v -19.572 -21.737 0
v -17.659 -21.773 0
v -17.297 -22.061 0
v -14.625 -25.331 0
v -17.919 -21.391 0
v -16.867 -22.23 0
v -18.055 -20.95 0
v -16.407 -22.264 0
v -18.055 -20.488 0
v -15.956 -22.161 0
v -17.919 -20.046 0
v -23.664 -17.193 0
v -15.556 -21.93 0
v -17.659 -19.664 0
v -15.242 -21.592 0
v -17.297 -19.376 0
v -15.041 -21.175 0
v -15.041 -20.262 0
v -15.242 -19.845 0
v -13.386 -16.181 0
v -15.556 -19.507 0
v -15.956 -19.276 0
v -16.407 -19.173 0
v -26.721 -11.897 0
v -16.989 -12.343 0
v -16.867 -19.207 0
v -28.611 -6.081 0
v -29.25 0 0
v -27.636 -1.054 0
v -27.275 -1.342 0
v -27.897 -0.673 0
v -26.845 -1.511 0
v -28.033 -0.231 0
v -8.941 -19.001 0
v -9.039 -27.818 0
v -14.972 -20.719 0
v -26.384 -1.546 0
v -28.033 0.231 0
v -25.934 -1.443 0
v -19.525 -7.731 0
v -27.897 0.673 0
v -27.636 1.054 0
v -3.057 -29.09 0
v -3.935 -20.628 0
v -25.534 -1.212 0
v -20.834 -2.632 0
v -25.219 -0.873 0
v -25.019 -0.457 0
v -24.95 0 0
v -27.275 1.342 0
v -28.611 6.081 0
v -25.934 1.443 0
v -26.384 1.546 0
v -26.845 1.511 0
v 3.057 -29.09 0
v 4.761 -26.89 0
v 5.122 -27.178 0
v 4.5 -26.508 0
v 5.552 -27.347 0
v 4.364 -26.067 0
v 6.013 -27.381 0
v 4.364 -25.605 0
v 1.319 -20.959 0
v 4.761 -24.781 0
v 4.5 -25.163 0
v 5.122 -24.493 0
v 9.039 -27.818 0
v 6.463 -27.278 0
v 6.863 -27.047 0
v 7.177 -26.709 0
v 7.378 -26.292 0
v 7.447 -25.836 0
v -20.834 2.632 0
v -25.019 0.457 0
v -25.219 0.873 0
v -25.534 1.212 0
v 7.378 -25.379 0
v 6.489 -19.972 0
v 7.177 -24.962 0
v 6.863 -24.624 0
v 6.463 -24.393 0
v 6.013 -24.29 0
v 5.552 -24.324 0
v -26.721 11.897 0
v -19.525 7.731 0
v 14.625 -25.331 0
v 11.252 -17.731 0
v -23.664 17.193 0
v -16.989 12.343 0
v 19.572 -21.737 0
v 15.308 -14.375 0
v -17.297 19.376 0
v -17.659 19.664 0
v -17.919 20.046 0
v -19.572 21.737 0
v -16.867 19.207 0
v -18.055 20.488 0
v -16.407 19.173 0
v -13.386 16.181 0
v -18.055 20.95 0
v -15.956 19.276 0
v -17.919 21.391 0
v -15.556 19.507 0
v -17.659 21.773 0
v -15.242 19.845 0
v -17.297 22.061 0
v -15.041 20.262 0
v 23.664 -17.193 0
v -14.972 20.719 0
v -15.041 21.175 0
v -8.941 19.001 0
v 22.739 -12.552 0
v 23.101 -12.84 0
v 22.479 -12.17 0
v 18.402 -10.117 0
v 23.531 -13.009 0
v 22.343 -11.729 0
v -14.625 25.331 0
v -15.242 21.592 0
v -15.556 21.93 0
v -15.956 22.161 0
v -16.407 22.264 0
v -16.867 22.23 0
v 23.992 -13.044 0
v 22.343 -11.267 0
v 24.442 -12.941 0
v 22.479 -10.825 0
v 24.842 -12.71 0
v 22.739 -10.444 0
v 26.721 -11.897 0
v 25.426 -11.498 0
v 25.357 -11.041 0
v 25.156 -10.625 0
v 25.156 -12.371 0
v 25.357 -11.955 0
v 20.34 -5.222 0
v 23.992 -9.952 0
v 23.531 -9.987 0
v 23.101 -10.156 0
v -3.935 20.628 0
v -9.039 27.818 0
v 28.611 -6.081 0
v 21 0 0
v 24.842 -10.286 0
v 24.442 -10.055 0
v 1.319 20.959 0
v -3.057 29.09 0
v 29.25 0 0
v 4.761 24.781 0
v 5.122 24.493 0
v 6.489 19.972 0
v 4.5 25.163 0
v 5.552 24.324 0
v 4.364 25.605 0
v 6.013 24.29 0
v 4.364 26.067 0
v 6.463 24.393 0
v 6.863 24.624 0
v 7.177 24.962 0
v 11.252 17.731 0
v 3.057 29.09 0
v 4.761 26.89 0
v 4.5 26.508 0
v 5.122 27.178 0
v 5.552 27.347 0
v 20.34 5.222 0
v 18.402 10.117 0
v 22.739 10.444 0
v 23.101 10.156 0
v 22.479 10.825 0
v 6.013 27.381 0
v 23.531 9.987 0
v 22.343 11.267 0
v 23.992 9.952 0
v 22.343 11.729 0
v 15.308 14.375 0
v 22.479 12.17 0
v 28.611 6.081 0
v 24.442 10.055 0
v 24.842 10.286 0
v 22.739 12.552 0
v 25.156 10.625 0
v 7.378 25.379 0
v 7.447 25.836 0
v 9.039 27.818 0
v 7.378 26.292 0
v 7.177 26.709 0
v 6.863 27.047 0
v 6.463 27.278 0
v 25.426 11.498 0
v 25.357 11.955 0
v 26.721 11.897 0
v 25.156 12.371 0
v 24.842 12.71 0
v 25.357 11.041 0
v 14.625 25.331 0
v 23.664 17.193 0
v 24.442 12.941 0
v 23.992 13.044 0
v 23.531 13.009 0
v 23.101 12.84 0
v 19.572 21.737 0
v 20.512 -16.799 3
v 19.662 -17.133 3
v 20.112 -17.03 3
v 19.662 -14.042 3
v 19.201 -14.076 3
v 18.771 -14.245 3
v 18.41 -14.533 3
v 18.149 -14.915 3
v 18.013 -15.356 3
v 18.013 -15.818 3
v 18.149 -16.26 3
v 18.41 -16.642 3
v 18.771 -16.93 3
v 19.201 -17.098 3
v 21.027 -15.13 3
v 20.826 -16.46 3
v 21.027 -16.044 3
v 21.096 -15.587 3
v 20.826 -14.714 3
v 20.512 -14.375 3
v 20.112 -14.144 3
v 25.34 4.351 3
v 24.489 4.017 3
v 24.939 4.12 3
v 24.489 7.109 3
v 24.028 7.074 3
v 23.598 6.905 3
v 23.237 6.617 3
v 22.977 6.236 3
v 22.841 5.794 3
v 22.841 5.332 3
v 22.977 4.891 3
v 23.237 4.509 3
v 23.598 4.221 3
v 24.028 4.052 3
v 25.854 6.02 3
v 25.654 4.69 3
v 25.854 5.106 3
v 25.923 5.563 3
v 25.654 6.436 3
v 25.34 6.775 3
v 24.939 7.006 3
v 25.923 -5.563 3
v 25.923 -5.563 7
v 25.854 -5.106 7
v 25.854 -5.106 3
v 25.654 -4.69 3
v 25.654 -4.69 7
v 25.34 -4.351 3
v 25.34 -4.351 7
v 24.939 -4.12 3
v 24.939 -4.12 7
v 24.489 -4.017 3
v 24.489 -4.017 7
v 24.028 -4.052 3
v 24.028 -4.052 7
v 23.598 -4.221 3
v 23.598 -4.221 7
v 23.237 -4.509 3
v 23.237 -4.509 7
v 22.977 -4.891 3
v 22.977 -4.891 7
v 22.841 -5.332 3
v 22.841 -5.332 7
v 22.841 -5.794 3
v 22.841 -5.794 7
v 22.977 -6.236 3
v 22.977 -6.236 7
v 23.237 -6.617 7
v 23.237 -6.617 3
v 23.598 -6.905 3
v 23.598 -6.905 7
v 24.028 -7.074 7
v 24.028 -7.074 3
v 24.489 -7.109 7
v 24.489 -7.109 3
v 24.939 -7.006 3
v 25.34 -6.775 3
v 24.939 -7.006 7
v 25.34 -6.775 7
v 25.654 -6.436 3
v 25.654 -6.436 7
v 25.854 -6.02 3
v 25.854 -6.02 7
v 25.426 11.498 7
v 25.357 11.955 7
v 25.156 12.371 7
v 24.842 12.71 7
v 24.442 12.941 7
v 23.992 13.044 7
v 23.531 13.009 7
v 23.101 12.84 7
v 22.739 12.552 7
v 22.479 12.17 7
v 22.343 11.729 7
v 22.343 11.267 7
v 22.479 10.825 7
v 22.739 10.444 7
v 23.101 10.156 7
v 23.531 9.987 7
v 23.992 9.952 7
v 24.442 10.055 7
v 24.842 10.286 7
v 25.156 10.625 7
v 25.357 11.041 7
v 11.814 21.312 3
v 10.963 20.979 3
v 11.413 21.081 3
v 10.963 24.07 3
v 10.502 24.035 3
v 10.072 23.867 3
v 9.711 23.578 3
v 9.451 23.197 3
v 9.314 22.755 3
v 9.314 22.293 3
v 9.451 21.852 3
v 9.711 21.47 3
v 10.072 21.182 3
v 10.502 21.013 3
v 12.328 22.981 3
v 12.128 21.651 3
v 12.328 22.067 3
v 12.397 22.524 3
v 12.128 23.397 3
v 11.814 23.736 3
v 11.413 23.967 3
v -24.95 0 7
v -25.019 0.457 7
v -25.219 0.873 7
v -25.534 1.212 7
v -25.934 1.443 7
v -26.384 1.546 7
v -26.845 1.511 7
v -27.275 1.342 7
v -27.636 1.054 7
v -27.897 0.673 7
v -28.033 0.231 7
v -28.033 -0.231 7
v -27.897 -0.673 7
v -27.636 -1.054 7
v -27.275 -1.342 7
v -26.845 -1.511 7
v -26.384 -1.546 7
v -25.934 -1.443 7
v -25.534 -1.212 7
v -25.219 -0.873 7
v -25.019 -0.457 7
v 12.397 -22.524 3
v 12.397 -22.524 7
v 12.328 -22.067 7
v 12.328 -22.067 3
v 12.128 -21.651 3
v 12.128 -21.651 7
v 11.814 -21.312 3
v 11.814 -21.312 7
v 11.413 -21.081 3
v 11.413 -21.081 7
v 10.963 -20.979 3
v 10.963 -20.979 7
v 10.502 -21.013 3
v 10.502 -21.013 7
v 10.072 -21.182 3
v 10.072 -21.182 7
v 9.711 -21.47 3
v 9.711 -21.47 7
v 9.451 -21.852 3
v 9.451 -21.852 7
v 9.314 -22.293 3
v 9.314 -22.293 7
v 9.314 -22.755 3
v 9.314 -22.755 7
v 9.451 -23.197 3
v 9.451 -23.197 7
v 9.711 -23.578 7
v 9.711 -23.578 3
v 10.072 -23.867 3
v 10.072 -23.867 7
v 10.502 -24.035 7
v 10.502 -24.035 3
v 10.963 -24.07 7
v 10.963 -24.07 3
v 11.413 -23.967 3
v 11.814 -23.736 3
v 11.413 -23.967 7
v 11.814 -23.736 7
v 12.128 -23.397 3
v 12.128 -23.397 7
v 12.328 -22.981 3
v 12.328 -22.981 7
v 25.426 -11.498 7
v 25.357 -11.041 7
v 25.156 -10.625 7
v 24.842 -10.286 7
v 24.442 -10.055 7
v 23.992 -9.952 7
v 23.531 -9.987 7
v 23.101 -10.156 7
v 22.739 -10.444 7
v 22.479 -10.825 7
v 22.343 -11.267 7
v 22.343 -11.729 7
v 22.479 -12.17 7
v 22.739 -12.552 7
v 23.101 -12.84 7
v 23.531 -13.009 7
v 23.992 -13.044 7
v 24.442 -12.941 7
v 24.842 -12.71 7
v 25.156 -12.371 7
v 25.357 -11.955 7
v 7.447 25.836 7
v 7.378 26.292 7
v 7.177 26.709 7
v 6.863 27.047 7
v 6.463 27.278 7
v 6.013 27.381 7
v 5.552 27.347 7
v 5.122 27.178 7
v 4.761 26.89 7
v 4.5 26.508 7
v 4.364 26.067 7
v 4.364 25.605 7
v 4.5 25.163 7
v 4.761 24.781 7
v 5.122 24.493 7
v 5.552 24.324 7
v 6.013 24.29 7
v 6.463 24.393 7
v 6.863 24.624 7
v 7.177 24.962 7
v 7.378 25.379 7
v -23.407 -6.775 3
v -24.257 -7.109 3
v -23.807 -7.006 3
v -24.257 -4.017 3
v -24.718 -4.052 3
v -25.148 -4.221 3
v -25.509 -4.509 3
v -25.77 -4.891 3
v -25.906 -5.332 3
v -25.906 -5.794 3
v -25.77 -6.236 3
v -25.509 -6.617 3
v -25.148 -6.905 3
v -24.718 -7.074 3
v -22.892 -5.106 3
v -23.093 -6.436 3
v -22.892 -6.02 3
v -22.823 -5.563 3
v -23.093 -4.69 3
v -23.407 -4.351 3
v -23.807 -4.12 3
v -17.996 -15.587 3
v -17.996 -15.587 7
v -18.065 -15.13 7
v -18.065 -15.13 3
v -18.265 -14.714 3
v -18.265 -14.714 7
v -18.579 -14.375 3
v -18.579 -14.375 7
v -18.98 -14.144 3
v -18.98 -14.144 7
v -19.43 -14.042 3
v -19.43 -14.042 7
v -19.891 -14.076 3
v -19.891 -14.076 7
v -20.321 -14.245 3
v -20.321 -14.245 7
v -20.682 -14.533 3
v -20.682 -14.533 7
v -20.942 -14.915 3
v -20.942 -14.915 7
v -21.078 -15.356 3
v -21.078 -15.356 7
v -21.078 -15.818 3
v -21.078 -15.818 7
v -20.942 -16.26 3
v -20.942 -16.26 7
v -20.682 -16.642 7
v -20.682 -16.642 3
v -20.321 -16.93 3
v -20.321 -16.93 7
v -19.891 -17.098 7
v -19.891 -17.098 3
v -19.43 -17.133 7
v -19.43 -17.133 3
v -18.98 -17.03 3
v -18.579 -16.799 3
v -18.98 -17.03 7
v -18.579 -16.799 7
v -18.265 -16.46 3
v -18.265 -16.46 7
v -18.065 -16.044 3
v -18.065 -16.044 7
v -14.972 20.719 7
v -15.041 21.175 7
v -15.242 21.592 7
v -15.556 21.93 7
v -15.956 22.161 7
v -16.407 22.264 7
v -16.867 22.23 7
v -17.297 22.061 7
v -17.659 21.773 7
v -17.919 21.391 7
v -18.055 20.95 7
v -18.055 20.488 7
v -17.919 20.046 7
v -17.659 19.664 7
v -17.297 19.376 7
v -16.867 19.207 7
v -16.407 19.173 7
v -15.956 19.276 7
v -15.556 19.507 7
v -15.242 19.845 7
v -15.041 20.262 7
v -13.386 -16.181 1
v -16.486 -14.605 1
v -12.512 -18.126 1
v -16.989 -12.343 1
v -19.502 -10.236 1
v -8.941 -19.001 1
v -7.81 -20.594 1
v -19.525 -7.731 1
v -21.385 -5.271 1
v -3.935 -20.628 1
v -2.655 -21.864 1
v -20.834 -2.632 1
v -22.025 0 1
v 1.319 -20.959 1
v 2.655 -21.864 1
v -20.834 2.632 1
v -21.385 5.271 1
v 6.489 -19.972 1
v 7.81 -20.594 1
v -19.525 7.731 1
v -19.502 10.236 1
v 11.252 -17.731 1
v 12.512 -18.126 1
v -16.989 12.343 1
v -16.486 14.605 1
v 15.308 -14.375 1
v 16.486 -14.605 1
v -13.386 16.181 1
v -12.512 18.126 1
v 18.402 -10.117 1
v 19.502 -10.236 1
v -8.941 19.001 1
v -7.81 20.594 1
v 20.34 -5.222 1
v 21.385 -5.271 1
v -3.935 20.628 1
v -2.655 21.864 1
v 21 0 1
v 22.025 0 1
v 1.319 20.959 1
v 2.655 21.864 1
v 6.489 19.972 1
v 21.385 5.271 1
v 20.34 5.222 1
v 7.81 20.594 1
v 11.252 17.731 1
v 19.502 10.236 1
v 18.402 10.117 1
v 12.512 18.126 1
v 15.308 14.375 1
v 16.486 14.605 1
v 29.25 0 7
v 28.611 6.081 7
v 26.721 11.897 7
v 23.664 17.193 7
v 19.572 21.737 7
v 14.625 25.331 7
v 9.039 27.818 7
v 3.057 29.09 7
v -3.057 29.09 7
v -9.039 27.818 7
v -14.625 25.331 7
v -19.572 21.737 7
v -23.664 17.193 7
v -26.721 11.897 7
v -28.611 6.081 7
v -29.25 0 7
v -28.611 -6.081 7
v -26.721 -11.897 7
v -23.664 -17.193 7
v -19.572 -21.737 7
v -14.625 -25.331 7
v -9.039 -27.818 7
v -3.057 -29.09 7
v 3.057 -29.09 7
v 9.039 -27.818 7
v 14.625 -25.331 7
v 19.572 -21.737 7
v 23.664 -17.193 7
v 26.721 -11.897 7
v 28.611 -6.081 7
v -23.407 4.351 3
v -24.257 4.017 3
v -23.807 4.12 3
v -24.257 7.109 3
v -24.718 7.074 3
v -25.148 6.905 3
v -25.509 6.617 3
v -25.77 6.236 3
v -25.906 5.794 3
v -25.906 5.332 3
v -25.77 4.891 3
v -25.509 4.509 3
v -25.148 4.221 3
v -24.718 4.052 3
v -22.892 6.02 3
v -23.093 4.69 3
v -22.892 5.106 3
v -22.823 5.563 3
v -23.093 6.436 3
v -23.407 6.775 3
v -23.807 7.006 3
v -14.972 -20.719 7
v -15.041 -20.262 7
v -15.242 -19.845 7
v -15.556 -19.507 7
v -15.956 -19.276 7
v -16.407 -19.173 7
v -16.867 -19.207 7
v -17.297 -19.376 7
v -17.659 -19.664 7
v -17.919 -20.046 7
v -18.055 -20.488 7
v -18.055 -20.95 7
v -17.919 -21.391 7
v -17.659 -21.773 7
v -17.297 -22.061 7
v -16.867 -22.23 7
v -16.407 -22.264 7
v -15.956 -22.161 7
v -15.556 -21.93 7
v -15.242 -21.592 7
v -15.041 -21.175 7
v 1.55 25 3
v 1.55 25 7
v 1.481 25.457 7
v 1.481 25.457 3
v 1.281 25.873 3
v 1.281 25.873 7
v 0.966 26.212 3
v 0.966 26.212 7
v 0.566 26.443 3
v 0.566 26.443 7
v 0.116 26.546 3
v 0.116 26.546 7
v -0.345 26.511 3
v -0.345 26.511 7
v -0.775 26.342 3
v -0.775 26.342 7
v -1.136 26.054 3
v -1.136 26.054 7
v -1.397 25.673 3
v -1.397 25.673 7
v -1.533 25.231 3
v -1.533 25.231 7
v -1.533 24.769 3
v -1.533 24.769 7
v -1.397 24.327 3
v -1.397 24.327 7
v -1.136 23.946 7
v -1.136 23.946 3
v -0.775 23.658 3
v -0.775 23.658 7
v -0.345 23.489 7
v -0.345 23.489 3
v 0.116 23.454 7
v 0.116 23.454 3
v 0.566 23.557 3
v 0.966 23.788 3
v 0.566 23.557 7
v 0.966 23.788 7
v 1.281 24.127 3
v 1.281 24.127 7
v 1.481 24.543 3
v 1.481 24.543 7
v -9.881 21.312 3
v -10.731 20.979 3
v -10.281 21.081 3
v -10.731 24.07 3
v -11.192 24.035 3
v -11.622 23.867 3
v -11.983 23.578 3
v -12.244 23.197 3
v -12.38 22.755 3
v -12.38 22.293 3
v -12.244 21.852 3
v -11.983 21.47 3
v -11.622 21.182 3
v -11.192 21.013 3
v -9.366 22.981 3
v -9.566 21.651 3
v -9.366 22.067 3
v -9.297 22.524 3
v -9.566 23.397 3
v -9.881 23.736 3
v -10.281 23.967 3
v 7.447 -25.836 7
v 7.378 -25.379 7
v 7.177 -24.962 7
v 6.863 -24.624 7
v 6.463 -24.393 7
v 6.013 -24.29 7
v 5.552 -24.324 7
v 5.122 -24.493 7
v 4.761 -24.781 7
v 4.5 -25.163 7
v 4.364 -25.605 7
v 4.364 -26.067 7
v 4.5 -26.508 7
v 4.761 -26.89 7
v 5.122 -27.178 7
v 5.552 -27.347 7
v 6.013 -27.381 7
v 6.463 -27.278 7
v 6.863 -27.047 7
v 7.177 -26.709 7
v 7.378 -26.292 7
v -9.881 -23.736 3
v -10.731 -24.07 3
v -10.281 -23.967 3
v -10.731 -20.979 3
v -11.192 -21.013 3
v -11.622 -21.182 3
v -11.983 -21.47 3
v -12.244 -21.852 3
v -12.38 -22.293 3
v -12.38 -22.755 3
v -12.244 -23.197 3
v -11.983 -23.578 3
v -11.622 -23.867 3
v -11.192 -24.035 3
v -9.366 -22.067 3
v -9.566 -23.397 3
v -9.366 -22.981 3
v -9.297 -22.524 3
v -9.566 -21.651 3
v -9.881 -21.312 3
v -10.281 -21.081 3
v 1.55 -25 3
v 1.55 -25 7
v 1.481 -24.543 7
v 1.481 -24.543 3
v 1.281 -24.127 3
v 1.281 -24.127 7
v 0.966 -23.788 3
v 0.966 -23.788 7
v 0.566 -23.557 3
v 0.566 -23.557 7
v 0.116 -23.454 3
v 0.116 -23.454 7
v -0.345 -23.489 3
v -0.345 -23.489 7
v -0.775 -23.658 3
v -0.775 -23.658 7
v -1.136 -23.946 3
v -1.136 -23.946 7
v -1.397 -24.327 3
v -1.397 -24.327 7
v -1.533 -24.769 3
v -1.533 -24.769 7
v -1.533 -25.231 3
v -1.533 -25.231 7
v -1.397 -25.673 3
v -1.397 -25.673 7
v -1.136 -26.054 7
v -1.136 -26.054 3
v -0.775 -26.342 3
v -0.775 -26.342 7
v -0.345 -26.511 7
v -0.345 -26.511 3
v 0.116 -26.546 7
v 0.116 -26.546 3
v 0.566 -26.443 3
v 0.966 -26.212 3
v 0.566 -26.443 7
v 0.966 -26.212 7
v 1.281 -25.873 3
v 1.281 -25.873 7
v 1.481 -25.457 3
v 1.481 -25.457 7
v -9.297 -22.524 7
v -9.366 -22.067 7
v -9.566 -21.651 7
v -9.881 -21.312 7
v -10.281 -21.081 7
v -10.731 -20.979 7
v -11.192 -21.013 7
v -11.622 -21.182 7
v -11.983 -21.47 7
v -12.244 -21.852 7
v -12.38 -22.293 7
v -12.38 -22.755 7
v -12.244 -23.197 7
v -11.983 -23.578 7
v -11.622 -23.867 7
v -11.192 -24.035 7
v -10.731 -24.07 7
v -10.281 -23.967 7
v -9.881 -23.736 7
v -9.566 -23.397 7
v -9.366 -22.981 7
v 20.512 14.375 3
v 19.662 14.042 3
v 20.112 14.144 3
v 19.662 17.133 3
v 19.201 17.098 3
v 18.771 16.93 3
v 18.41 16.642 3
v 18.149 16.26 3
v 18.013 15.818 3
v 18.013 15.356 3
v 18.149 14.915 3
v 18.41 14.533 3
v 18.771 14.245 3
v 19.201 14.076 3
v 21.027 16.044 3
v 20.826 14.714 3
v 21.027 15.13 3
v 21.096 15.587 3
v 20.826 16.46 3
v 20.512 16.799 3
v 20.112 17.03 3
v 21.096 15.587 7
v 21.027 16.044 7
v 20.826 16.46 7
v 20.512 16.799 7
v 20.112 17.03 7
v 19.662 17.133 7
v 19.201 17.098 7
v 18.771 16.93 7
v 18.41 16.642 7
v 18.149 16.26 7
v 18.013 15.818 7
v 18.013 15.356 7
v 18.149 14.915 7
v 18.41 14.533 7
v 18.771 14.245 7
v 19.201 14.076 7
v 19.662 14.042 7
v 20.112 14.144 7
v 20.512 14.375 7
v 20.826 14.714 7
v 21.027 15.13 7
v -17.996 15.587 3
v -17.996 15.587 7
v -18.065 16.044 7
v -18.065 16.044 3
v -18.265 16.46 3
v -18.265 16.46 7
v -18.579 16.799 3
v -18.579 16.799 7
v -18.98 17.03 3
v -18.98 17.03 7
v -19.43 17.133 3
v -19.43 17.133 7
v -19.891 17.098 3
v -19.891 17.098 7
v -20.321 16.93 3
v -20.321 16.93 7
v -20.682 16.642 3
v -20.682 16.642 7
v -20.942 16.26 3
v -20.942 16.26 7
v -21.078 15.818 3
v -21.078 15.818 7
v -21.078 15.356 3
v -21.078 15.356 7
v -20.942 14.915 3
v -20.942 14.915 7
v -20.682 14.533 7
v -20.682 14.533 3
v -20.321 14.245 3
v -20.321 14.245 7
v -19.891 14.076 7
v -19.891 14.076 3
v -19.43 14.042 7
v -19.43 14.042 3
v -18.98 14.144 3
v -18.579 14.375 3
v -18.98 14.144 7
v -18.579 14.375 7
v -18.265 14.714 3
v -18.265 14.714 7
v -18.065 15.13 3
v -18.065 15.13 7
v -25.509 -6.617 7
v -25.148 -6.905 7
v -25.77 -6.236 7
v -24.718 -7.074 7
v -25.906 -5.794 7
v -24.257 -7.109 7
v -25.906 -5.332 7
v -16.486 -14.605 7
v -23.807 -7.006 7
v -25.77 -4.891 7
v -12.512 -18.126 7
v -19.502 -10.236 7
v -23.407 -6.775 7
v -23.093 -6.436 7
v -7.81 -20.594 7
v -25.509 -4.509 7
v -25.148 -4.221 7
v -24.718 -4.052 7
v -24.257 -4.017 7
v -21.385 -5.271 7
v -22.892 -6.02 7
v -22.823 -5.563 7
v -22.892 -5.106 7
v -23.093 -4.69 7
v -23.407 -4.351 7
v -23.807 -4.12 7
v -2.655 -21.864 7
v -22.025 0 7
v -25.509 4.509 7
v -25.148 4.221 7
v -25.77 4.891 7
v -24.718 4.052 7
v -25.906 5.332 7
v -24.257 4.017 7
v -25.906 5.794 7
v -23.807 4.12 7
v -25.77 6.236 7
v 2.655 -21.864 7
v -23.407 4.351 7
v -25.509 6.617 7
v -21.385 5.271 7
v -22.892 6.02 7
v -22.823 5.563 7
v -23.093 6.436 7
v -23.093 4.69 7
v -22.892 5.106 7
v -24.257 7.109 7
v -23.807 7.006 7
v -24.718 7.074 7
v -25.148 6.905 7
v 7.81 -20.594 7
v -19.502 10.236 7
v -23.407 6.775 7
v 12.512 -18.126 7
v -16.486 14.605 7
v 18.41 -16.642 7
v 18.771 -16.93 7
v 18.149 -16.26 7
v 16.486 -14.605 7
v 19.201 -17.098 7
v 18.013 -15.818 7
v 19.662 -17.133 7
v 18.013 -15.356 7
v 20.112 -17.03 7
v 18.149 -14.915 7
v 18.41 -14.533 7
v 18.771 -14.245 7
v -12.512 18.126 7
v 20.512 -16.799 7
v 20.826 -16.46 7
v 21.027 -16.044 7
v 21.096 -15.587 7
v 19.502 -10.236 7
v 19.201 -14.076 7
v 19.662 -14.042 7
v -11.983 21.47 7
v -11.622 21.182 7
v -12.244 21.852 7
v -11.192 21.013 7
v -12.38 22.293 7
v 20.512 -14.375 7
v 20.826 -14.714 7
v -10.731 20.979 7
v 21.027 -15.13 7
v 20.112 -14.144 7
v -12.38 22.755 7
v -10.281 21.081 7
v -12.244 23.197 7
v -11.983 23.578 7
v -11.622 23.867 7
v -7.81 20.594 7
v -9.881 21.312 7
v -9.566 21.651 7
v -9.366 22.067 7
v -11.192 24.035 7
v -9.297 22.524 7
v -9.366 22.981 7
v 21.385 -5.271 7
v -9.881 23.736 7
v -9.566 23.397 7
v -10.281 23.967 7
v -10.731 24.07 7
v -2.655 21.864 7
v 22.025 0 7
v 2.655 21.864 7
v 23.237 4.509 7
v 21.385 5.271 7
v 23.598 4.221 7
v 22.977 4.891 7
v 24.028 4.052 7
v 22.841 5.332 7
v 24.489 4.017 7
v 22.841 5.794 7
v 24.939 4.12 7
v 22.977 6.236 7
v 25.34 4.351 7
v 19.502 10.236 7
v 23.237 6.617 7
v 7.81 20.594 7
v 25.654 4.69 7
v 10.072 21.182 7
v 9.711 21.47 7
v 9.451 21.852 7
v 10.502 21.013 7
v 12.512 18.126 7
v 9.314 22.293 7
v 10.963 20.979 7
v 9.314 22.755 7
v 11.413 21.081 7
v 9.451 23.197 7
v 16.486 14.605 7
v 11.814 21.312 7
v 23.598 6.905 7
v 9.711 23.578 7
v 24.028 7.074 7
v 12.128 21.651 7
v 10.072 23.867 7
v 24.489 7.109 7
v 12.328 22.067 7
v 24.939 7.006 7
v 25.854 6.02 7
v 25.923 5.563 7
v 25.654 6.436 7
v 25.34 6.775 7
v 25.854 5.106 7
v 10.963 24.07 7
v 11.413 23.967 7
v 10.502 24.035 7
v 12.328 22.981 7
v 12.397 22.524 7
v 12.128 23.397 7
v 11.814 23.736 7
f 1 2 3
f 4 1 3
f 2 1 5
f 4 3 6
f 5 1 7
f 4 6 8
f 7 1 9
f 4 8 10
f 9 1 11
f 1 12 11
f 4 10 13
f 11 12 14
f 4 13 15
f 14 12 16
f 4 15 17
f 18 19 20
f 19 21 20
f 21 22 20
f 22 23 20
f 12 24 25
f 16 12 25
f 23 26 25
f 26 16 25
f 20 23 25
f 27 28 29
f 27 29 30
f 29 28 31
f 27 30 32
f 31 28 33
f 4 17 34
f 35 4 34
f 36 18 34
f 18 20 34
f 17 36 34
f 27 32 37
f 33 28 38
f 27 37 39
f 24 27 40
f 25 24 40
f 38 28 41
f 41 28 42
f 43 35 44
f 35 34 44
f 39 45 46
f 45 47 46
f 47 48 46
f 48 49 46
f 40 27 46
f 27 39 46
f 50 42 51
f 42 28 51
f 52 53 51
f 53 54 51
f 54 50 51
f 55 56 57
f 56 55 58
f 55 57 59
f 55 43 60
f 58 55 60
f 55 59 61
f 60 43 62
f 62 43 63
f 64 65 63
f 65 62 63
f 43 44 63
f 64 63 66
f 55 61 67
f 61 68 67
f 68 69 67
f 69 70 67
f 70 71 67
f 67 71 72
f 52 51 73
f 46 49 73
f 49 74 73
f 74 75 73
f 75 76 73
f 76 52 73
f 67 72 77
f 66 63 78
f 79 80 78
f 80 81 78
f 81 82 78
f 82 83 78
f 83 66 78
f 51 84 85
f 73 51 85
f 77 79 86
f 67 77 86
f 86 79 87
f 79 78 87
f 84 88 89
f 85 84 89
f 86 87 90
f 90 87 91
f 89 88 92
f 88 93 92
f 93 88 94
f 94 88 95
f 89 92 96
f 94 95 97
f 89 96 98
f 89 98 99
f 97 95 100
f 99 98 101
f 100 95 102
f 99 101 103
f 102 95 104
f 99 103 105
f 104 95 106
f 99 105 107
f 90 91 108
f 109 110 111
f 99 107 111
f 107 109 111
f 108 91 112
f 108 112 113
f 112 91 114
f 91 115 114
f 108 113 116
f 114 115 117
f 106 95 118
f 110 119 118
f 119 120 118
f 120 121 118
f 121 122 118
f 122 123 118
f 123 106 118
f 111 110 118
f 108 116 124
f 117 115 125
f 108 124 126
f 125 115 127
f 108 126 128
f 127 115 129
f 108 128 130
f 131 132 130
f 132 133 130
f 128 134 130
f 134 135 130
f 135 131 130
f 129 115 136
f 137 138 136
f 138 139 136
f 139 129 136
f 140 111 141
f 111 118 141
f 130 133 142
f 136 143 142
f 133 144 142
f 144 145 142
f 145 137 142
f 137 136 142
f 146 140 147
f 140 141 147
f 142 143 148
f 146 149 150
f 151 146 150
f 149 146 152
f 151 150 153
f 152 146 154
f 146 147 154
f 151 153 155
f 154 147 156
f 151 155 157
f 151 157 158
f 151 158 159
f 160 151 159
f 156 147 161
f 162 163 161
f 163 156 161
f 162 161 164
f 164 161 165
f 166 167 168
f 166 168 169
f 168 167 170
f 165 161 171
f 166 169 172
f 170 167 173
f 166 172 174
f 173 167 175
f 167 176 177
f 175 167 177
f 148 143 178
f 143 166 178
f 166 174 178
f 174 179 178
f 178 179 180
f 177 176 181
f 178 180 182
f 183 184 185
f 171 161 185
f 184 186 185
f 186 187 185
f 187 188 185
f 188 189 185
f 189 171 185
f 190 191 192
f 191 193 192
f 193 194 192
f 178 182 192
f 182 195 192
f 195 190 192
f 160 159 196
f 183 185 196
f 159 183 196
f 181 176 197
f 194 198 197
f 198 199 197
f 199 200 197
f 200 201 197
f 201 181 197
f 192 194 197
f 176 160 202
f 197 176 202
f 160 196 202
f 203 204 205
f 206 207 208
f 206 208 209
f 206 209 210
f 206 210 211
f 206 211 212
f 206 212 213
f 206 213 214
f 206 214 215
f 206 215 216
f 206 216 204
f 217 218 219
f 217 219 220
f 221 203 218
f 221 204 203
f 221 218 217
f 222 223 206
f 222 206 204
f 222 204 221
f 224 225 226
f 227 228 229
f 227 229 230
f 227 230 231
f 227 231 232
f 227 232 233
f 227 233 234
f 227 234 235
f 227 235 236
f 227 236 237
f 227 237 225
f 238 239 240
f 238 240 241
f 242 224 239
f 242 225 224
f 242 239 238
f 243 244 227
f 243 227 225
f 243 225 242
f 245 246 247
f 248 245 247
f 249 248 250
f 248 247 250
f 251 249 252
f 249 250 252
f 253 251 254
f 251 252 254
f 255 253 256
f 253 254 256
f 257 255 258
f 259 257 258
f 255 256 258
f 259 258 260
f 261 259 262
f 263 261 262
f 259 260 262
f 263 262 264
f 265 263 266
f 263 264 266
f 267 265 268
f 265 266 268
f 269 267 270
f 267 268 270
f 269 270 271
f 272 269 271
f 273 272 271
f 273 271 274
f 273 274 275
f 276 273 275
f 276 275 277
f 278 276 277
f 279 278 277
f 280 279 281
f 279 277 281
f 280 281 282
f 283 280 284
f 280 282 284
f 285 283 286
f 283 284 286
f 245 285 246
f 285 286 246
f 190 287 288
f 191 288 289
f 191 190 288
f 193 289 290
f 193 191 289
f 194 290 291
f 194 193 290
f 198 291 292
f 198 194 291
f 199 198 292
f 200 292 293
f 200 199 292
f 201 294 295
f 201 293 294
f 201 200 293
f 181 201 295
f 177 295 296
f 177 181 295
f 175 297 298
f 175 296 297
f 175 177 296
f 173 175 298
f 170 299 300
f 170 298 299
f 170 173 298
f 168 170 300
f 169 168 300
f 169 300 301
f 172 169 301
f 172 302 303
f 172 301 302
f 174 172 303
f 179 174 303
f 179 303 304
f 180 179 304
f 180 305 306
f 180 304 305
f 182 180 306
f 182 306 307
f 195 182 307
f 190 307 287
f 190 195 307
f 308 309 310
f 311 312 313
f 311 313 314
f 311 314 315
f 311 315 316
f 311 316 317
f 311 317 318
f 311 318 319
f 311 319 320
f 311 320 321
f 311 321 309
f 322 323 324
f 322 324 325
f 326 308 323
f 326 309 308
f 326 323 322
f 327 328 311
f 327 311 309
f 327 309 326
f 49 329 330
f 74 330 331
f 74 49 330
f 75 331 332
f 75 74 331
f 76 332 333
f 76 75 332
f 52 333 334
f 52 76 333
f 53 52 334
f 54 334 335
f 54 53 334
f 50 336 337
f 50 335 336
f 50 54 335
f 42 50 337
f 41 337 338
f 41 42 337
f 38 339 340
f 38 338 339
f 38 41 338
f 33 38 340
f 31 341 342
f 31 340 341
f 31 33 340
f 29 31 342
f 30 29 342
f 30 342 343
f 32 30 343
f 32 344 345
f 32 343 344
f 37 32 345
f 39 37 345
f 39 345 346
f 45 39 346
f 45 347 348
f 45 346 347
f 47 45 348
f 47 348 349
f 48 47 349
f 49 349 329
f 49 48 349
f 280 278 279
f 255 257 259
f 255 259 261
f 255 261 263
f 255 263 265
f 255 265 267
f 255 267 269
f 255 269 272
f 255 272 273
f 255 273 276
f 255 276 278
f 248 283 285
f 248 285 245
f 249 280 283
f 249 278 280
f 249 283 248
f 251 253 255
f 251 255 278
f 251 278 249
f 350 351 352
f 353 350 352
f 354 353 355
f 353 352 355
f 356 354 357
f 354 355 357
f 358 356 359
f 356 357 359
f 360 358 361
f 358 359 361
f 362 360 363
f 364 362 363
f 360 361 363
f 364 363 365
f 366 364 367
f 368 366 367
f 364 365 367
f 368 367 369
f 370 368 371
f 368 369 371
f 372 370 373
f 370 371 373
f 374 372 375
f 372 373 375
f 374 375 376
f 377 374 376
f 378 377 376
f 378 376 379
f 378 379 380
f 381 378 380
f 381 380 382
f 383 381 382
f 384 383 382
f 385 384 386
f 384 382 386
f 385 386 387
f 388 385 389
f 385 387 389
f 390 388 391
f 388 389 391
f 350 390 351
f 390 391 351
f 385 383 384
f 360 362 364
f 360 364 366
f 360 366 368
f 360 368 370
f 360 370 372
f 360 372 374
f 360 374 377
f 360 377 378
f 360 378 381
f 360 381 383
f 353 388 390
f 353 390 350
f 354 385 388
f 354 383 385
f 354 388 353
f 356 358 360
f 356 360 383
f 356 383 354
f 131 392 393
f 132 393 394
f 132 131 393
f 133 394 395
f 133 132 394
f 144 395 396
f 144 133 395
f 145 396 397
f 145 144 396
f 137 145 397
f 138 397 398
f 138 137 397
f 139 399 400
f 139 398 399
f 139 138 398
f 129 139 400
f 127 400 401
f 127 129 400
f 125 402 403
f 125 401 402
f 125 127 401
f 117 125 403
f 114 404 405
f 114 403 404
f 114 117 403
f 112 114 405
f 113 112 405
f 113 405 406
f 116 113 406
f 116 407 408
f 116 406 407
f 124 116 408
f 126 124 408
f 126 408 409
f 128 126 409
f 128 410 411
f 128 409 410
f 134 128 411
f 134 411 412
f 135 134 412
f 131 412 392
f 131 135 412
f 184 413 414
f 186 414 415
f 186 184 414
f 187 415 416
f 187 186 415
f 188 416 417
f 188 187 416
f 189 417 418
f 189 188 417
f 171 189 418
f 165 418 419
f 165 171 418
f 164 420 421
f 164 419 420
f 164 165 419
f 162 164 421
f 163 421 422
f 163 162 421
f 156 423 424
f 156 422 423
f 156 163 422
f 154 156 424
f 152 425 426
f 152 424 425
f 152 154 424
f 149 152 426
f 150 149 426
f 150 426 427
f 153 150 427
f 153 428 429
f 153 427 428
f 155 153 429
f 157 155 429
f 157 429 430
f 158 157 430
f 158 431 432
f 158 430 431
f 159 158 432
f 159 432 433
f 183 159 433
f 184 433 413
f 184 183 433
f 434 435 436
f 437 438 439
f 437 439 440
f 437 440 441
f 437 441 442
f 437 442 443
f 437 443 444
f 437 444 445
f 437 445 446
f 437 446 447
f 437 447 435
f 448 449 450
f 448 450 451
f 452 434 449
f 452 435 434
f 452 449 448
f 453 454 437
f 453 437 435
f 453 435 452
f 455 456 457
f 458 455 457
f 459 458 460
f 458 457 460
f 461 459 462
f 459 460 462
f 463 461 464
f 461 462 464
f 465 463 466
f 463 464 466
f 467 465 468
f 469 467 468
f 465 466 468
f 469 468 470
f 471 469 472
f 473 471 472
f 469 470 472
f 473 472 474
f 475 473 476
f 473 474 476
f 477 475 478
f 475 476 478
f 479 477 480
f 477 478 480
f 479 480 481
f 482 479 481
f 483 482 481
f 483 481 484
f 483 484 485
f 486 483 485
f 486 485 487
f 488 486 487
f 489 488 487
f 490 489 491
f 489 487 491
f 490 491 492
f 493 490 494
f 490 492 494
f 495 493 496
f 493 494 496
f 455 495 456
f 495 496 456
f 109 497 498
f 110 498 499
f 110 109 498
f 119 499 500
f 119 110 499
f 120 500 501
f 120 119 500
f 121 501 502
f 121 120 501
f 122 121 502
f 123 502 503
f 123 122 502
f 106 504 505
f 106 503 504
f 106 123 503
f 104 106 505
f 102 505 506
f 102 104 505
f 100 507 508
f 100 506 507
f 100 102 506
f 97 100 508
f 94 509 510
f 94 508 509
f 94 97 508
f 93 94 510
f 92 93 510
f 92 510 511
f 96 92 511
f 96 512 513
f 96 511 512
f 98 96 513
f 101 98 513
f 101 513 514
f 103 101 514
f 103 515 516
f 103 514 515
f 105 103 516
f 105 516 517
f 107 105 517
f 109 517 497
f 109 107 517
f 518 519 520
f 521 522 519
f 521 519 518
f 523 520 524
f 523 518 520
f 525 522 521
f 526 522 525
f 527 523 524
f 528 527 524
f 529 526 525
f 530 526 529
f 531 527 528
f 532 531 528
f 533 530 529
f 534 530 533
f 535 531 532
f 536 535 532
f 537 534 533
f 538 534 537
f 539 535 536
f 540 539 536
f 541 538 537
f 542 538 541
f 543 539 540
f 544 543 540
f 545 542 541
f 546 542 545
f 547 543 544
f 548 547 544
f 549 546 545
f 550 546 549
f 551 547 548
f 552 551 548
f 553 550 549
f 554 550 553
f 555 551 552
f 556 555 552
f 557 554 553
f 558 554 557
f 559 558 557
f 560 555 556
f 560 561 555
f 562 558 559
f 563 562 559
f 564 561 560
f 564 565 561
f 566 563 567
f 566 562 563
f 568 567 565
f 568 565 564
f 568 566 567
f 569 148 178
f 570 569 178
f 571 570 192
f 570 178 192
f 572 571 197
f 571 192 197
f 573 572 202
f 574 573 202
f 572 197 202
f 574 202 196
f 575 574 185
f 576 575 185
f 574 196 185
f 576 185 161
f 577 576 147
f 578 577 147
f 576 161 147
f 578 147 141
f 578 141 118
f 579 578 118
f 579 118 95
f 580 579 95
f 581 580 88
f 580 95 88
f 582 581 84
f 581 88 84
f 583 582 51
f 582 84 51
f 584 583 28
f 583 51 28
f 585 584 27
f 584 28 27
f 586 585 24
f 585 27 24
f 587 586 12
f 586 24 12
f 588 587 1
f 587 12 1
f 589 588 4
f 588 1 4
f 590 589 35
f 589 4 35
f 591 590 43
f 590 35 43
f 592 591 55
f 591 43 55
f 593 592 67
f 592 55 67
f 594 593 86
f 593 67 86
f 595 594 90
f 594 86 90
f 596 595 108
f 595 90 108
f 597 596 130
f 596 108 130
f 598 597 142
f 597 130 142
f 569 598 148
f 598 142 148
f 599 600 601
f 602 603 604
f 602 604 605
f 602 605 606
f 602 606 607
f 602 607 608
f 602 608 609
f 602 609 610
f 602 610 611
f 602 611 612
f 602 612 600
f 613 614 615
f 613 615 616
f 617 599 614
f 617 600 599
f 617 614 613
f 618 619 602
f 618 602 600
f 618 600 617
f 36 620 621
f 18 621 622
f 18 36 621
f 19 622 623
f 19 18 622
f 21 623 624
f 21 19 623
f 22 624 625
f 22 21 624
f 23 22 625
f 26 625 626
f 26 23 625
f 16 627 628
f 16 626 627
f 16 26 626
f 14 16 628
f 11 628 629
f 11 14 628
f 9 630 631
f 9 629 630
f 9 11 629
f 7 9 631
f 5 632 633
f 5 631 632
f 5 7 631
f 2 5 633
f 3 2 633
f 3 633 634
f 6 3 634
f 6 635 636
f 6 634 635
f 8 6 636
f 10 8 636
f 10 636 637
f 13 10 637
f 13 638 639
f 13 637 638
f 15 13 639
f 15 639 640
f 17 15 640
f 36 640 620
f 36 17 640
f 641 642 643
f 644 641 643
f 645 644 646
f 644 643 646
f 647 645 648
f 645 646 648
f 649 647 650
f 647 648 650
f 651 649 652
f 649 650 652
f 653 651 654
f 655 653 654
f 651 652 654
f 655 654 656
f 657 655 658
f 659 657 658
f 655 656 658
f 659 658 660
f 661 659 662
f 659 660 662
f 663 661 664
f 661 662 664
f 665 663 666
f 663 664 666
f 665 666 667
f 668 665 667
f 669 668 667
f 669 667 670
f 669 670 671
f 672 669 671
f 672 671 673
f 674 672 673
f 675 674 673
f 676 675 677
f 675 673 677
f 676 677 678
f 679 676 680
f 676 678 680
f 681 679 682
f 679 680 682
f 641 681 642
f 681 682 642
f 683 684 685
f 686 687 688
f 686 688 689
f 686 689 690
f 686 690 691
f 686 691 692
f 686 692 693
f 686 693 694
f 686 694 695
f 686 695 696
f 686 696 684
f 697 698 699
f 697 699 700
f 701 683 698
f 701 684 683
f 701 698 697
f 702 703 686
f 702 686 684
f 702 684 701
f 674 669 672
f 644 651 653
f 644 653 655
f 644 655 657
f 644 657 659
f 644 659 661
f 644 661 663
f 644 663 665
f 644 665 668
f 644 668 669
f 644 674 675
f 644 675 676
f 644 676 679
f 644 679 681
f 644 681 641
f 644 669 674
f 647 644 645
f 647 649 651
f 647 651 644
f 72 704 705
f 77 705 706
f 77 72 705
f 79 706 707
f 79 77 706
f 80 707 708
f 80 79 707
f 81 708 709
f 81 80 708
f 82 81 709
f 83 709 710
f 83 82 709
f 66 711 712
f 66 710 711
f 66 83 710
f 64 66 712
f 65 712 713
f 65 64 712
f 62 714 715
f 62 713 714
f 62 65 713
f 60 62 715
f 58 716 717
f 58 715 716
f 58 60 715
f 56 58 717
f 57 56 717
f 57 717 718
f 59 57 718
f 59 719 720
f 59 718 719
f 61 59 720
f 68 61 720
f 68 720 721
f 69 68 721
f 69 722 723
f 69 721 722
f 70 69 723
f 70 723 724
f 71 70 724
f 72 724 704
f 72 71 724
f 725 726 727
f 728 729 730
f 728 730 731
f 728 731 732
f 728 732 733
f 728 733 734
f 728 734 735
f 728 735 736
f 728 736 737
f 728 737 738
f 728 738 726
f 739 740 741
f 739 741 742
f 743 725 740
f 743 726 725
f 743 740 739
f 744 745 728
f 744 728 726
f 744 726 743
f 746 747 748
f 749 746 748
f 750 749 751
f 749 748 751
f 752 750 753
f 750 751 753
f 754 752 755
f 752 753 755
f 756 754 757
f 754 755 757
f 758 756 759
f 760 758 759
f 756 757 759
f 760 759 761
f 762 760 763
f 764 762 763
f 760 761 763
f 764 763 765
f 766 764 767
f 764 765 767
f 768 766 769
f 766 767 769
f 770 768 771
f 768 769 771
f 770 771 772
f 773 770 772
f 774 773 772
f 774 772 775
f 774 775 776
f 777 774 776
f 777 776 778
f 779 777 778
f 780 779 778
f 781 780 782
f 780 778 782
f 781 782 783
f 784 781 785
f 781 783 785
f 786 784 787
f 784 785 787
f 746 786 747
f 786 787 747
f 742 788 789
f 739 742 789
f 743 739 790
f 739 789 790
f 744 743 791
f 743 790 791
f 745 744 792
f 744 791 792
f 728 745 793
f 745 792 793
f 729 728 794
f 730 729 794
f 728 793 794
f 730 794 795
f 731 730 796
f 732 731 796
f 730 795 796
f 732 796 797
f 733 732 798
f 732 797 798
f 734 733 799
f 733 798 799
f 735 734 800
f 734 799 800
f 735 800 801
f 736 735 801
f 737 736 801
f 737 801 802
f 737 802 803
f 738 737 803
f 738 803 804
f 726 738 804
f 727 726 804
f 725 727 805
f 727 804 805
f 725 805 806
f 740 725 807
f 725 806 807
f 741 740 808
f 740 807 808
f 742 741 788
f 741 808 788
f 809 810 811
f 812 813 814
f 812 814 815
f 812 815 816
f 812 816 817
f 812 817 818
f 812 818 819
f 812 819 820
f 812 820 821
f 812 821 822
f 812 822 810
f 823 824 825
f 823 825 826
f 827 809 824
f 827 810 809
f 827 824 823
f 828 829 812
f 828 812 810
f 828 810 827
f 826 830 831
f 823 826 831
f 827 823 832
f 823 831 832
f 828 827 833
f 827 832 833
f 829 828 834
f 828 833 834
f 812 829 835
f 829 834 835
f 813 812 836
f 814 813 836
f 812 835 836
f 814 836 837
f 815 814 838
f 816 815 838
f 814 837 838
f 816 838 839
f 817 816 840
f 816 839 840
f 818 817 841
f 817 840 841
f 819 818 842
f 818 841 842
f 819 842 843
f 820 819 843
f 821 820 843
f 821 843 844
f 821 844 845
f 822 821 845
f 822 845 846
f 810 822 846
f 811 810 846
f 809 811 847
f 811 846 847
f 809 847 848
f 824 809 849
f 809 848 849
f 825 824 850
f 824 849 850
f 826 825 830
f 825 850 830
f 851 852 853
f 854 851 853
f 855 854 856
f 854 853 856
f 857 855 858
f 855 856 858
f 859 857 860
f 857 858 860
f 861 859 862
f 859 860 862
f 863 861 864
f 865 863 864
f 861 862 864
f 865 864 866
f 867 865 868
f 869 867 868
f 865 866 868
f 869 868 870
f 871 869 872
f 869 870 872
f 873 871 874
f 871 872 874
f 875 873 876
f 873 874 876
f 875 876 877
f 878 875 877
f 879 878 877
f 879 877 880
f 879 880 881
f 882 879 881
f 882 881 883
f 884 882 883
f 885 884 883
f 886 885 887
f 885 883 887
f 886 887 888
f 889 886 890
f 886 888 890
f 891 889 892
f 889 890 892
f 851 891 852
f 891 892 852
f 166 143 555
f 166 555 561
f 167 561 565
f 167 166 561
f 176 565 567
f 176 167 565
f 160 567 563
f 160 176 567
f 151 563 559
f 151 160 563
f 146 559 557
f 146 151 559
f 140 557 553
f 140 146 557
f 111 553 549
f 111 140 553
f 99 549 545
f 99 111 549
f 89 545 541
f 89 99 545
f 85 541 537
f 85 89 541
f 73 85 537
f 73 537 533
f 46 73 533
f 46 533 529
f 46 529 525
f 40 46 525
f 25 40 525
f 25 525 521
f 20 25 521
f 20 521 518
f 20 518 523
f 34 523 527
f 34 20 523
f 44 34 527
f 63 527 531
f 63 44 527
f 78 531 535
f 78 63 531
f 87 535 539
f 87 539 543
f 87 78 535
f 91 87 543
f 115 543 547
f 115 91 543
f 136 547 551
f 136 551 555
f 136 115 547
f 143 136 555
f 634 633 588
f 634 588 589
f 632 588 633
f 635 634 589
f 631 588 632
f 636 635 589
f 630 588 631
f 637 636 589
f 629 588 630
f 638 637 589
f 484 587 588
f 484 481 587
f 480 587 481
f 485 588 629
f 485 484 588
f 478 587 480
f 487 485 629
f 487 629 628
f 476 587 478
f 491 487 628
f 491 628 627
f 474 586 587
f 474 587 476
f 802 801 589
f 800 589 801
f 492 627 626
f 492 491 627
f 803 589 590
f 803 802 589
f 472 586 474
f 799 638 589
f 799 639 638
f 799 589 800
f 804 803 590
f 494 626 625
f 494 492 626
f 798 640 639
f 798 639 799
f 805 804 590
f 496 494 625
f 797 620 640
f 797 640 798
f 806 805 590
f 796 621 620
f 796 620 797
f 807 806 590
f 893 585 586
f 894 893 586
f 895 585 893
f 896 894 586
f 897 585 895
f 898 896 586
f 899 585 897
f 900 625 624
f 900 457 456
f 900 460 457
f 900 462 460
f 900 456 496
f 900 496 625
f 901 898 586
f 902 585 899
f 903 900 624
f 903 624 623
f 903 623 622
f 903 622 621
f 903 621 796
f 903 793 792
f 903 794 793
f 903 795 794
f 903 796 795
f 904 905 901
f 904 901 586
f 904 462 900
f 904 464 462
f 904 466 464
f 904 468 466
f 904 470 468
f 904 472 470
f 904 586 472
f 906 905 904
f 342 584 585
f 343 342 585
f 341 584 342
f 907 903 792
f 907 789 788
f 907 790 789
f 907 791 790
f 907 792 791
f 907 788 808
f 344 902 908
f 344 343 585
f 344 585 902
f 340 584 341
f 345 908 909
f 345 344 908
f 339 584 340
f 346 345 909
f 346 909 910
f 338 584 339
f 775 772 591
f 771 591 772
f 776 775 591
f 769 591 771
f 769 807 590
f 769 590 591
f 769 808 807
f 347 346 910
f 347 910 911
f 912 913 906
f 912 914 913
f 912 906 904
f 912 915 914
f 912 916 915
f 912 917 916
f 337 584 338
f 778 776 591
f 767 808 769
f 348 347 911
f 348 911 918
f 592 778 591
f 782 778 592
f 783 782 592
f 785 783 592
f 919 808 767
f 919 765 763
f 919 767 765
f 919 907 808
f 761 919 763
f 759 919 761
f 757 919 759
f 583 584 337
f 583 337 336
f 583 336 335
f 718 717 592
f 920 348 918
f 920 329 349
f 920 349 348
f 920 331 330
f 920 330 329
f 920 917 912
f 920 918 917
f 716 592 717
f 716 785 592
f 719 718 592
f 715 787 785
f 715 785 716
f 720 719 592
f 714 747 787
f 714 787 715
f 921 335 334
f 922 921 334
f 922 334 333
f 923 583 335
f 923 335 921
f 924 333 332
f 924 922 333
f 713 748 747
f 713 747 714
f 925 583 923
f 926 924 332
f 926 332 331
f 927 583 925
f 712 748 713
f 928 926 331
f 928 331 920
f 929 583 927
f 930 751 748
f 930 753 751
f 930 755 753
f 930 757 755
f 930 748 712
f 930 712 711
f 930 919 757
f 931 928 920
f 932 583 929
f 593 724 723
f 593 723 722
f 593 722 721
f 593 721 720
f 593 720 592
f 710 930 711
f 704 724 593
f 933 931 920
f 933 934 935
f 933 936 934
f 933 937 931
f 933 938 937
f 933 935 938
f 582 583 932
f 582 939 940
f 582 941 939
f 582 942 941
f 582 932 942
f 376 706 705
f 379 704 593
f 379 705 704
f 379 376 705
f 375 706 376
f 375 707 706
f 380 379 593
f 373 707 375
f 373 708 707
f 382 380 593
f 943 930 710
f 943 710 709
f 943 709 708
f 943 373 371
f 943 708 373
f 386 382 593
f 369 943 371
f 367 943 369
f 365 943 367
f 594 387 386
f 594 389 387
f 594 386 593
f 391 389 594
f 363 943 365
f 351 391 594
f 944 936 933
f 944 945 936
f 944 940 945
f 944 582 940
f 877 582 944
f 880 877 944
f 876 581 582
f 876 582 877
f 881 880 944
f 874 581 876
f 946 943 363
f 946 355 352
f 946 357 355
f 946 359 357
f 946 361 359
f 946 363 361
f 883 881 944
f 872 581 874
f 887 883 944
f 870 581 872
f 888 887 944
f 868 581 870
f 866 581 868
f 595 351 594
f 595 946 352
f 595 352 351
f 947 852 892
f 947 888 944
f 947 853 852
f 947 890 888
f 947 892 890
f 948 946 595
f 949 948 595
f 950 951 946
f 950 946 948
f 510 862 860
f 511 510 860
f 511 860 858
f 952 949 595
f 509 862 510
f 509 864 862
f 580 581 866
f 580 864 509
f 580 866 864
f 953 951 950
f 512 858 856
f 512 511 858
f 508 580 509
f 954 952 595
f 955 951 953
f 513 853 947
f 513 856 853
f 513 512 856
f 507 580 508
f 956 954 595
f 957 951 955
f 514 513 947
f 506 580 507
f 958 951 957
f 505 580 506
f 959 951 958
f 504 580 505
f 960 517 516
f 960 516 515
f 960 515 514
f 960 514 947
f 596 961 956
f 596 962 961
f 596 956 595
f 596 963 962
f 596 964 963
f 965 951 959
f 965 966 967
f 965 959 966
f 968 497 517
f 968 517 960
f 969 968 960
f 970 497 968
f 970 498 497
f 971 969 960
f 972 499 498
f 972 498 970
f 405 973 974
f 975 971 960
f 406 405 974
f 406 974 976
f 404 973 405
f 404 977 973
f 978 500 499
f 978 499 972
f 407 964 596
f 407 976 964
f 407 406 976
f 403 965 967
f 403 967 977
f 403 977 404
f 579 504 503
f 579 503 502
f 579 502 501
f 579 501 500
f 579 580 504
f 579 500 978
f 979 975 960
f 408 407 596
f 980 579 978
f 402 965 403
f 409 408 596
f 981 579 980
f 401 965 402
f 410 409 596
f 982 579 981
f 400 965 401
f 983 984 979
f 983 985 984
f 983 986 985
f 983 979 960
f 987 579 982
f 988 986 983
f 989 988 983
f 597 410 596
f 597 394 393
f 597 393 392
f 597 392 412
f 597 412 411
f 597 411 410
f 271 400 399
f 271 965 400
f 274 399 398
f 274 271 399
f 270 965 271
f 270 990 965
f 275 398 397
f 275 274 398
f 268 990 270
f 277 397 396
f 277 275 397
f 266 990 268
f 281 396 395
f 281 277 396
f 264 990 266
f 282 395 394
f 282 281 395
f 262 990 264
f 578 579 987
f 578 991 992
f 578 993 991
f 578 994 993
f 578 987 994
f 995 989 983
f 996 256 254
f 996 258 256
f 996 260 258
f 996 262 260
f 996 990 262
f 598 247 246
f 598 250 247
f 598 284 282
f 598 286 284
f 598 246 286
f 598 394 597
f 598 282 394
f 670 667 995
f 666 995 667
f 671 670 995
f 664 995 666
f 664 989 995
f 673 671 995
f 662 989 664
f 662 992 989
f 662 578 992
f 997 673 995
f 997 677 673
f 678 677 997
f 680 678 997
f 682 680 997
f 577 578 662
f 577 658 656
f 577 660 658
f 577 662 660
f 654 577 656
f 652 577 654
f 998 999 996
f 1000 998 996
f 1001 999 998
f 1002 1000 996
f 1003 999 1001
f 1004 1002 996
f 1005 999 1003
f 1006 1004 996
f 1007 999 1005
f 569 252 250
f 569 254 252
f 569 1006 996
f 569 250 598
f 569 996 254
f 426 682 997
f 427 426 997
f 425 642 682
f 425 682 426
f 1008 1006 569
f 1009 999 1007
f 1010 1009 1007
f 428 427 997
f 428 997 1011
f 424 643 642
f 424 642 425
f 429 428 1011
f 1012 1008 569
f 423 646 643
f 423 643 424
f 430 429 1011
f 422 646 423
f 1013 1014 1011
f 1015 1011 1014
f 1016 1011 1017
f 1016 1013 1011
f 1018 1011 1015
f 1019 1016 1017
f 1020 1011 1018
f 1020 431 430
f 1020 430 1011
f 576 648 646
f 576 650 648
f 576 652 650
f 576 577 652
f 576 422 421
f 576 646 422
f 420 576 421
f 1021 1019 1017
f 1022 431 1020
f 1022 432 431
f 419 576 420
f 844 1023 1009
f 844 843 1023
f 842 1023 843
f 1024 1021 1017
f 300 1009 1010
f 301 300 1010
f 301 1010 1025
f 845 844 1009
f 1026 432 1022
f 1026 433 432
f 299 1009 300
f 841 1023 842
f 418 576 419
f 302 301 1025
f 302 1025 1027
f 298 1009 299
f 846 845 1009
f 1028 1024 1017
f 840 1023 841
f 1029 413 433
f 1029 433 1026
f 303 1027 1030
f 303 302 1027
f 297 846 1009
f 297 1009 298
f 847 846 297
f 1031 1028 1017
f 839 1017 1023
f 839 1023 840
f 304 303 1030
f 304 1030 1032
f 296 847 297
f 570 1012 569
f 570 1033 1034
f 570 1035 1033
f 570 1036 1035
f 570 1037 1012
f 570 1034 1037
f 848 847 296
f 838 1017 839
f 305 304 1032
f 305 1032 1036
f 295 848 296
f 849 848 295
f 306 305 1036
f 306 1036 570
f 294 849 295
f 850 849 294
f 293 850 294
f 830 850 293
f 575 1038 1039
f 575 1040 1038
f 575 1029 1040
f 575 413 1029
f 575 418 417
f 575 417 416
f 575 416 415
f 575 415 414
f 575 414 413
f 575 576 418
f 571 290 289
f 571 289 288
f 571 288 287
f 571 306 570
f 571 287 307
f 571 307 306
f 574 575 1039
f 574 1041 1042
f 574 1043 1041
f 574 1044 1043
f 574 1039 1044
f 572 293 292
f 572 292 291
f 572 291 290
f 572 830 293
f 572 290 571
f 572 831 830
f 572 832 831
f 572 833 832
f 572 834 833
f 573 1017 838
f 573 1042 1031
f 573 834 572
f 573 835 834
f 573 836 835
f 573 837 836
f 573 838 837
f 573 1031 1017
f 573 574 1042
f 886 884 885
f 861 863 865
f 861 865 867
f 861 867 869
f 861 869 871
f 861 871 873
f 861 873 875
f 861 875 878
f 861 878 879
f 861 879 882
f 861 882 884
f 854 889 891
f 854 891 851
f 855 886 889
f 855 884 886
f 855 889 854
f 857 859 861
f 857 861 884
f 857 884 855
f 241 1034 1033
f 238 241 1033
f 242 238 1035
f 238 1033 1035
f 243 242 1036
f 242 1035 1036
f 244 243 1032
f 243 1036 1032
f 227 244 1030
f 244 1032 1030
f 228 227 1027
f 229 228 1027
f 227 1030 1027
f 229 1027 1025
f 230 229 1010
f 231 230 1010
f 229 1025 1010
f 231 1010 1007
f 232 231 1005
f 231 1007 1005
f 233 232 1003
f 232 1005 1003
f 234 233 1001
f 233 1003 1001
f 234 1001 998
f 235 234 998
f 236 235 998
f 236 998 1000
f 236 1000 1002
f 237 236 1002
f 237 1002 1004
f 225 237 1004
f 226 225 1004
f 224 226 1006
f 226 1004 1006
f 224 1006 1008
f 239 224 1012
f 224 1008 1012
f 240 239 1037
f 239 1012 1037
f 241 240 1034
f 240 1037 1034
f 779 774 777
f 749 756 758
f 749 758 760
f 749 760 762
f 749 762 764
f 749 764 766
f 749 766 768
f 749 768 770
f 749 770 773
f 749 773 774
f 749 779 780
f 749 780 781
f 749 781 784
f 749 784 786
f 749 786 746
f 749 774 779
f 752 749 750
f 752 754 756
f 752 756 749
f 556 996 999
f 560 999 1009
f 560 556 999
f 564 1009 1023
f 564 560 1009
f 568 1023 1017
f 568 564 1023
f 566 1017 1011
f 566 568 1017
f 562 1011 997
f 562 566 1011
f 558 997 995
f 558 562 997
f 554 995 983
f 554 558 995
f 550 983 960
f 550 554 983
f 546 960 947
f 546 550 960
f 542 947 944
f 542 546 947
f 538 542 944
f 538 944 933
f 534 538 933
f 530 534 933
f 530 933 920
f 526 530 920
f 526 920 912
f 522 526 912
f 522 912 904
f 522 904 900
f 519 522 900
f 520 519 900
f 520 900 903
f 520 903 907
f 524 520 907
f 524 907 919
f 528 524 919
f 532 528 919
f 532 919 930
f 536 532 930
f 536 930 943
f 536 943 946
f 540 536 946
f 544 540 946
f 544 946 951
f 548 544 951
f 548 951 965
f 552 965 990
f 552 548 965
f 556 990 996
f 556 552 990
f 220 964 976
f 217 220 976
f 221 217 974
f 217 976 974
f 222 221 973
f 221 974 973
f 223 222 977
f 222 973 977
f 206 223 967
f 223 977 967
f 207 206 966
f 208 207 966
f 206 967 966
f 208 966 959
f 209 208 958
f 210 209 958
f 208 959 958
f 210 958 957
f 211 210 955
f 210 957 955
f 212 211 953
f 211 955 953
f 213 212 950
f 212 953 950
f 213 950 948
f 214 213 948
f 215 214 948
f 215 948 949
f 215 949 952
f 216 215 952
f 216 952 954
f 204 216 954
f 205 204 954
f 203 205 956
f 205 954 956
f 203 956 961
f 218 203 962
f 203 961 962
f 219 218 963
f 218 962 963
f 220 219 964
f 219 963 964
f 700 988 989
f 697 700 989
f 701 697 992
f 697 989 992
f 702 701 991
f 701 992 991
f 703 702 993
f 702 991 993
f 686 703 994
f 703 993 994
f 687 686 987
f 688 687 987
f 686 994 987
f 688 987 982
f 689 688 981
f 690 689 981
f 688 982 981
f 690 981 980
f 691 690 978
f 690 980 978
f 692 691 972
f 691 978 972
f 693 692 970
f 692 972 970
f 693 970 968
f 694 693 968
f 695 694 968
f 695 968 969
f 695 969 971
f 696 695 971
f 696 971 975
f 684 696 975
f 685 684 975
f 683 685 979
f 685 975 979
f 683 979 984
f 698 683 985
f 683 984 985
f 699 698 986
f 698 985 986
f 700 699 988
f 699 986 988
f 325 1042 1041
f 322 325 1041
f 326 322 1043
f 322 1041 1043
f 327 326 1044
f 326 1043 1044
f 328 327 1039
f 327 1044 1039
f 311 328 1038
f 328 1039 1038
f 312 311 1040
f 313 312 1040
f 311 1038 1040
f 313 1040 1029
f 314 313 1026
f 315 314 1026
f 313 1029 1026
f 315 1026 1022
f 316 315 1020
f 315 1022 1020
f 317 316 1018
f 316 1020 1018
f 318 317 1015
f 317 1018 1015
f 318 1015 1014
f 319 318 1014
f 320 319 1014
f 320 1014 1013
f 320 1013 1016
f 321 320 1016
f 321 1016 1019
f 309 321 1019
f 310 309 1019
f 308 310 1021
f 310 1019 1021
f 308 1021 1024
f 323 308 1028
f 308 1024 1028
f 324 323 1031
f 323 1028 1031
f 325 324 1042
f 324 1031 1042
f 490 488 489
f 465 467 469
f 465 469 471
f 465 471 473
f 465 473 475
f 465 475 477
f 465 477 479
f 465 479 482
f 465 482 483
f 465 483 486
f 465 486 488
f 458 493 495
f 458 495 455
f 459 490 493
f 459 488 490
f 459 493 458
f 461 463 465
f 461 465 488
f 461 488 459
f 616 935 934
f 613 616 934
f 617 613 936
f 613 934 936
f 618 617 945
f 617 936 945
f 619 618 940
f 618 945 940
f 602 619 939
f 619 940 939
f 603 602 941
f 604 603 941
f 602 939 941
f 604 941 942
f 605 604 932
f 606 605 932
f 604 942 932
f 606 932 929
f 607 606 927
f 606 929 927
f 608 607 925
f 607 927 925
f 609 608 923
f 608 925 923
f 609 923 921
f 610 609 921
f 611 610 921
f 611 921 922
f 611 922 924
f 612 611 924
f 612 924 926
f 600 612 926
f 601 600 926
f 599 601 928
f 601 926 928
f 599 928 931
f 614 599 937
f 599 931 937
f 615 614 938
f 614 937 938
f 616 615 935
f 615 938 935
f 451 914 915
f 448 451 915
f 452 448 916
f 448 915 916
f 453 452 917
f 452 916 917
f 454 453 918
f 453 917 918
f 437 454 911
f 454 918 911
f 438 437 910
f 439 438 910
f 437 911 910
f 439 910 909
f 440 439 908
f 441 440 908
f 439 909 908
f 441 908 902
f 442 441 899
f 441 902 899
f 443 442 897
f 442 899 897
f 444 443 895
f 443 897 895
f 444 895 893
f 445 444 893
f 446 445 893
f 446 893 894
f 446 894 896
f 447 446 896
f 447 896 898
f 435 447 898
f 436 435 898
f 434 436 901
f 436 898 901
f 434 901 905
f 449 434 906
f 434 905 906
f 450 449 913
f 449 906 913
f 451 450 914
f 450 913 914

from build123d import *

# Parameters (mm, degrees)
SKETCH1_R           = 29.25
SKETCH1_R_2         = 22.025
BOSS_EXTRUDE1_DEPTH = 7
CUT_EXTRUDE1_START  = 7
SKETCH1_3_R         = 1.55
CUT_EXTRUDE1_DEPTH  = 4
SKETCH4_R           = 22.25
SKETCH4_R_2         = 21
BOSS_EXTRUDE2_DEPTH = 1
SKETCH3_R           = 1.55
CUT_EXTRUDE2_DEPTH  = 42.953843686


with BuildPart() as part:
    # Sketch1 → Boss-Extrude1 (new body)
    with BuildSketch(Plane.XY):
        Circle(SKETCH1_R)
        Circle(SKETCH1_R_2, mode=Mode.SUBTRACT)
    extrude(amount=BOSS_EXTRUDE1_DEPTH)

    # Sketch1<3> → Cut-Extrude1 (cut)
    with BuildSketch(Plane.XY.offset(CUT_EXTRUDE1_START)):
        with Locations((0, 25)):
            Circle(SKETCH1_3_R)
        with Locations((10.847093478, 22.524221698)):
            Circle(SKETCH1_3_R)
        with Locations((19.545787062, 15.587245046)):
            Circle(SKETCH1_3_R)
        with Locations((24.373197805, 5.563023349)):
            Circle(SKETCH1_3_R)
        with Locations((24.373197805, -5.563023349)):
            Circle(SKETCH1_3_R)
        with Locations((19.545787062, -15.587245046)):
            Circle(SKETCH1_3_R)
        with Locations((10.847093478, -22.524221698)):
            Circle(SKETCH1_3_R)
        with Locations((0, -25)):
            Circle(SKETCH1_3_R)
        with Locations((-10.847093478, -22.524221698)):
            Circle(SKETCH1_3_R)
        with Locations((-19.545787062, -15.587245046)):
            Circle(SKETCH1_3_R)
        with Locations((-24.373197805, -5.563023349)):
            Circle(SKETCH1_3_R)
        with Locations((-24.373197805, 5.563023349)):
            Circle(SKETCH1_3_R)
        with Locations((-19.545787062, 15.587245046)):
            Circle(SKETCH1_3_R)
        with Locations((-10.847093478, 22.524221698)):
            Circle(SKETCH1_3_R)
    extrude(amount=-CUT_EXTRUDE1_DEPTH, mode=Mode.SUBTRACT)

    # Sketch4 → Boss-Extrude2 (add)
    with BuildSketch(Plane.XY):
        Circle(SKETCH4_R)
        Circle(SKETCH4_R_2, mode=Mode.SUBTRACT)
    extrude(amount=BOSS_EXTRUDE2_DEPTH)

    # Sketch3 → Cut-Extrude2 (cut, through all)
    with BuildSketch(Plane.XY):
        with Locations((5.89680475, 25.835589673)):
            Circle(SKETCH3_R)
        with Locations((23.875674999, 11.497919087)):
            Circle(SKETCH3_R)
        with Locations((23.875674999, -11.497919087)):
            Circle(SKETCH3_R)
        with Locations((5.89680475, -25.835589673)):
            Circle(SKETCH3_R)
        with Locations((-16.522479749, -20.718534285)):
            Circle(SKETCH3_R)
        with Locations((-26.5, 0)):
            Circle(SKETCH3_R)
        with Locations((-16.522479749, 20.718534285)):
            Circle(SKETCH3_R)
    extrude(amount=CUT_EXTRUDE2_DEPTH, mode=Mode.SUBTRACT)


solid = part.part
